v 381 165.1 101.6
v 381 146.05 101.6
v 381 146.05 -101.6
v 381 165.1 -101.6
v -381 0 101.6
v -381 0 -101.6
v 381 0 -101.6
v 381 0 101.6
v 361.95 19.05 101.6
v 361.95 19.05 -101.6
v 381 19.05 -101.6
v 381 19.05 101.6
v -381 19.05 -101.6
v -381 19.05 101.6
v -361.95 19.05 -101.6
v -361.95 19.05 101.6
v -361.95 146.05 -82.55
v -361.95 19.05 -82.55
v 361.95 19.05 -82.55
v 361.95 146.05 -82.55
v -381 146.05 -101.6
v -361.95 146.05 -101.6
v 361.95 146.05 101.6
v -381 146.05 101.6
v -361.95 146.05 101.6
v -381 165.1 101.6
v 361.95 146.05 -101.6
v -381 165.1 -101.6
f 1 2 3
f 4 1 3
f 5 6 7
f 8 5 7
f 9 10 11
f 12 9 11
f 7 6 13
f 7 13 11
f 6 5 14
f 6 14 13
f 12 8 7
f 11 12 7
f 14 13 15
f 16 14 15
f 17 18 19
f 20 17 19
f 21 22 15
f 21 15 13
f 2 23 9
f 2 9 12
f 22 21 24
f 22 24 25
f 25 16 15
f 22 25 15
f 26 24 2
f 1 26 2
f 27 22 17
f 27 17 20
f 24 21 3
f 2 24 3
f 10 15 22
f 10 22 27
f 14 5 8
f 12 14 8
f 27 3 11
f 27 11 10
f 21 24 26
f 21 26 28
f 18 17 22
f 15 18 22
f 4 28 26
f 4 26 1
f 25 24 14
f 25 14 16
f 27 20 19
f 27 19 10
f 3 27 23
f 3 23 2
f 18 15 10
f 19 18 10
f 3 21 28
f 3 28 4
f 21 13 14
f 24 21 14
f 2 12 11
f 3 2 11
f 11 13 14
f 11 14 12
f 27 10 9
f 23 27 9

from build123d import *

# Parameters (mm, degrees)
SKETCH1_W             = 762
SKETCH1_H             = 203.2
BOSS_EXTRUDE1_DEPTH   = 19.05
BOSS_EXTRUDE2_DEPTH   = 127
BOSS_EXTRUDE2_2_DEPTH = 127
SKETCH2_3_W           = 723.9
SKETCH2_3_H           = 19.05
BOSS_EXTRUDE3_DEPTH   = 127
SKETCH3_W             = 762
SKETCH3_H             = 203.2
BOSS_EXTRUDE4_DEPTH   = 19.05


with BuildPart() as part:
    # Sketch1 → Boss-Extrude1 (new body)
    with BuildSketch(Plane(origin=(0, 0, 0), x_dir=(1, 0, 0), z_dir=(0, 1, 0))):
        Rectangle(SKETCH1_W, SKETCH1_H)
    extrude(amount=BOSS_EXTRUDE1_DEPTH)


with BuildPart() as body_2:
    # Sketch2 → Boss-Extrude2 (new body)
    with BuildSketch(Plane(origin=(0, 19.05, 0), x_dir=(1, 0, 0), z_dir=(0, 1, 0))):
        Polygon((-361.95, 101.6), (-381, 101.6), (-381, -101.6), (-361.95, -101.6), (-361.95, 82.55), align=None)
    extrude(amount=BOSS_EXTRUDE2_DEPTH)


with BuildPart() as body_3:
    # Sketch2 → Boss-Extrude2 2 (new body)
    with BuildSketch(Plane(origin=(0, 19.05, 0), x_dir=(1, 0, 0), z_dir=(0, 1, 0))):
        Polygon((381, 101.6), (361.95, 101.6), (361.95, 82.55), (361.95, -101.6), (381, -101.6), align=None)
    extrude(amount=BOSS_EXTRUDE2_2_DEPTH)


with BuildPart() as body_4:
    # Sketch2<3> → Boss-Extrude3 (new body)
    with BuildSketch(Plane(origin=(0, 19.05, 0), x_dir=(1, 0, 0), z_dir=(0, 1, 0))):
        with Locations((0, 92.075)):
            Rectangle(SKETCH2_3_W, SKETCH2_3_H)
    extrude(amount=BOSS_EXTRUDE3_DEPTH)


with BuildPart() as body_5:
    # Sketch3 → Boss-Extrude4 (new body)
    with BuildSketch(Plane(origin=(0, 146.05, 0), x_dir=(1, 0, 0), z_dir=(0, 1, 0))):
        Rectangle(SKETCH3_W, SKETCH3_H)
    extrude(amount=BOSS_EXTRUDE4_DEPTH)


solid = Compound([part.part, body_2.part, body_3.part, body_4.part, body_5.part])
